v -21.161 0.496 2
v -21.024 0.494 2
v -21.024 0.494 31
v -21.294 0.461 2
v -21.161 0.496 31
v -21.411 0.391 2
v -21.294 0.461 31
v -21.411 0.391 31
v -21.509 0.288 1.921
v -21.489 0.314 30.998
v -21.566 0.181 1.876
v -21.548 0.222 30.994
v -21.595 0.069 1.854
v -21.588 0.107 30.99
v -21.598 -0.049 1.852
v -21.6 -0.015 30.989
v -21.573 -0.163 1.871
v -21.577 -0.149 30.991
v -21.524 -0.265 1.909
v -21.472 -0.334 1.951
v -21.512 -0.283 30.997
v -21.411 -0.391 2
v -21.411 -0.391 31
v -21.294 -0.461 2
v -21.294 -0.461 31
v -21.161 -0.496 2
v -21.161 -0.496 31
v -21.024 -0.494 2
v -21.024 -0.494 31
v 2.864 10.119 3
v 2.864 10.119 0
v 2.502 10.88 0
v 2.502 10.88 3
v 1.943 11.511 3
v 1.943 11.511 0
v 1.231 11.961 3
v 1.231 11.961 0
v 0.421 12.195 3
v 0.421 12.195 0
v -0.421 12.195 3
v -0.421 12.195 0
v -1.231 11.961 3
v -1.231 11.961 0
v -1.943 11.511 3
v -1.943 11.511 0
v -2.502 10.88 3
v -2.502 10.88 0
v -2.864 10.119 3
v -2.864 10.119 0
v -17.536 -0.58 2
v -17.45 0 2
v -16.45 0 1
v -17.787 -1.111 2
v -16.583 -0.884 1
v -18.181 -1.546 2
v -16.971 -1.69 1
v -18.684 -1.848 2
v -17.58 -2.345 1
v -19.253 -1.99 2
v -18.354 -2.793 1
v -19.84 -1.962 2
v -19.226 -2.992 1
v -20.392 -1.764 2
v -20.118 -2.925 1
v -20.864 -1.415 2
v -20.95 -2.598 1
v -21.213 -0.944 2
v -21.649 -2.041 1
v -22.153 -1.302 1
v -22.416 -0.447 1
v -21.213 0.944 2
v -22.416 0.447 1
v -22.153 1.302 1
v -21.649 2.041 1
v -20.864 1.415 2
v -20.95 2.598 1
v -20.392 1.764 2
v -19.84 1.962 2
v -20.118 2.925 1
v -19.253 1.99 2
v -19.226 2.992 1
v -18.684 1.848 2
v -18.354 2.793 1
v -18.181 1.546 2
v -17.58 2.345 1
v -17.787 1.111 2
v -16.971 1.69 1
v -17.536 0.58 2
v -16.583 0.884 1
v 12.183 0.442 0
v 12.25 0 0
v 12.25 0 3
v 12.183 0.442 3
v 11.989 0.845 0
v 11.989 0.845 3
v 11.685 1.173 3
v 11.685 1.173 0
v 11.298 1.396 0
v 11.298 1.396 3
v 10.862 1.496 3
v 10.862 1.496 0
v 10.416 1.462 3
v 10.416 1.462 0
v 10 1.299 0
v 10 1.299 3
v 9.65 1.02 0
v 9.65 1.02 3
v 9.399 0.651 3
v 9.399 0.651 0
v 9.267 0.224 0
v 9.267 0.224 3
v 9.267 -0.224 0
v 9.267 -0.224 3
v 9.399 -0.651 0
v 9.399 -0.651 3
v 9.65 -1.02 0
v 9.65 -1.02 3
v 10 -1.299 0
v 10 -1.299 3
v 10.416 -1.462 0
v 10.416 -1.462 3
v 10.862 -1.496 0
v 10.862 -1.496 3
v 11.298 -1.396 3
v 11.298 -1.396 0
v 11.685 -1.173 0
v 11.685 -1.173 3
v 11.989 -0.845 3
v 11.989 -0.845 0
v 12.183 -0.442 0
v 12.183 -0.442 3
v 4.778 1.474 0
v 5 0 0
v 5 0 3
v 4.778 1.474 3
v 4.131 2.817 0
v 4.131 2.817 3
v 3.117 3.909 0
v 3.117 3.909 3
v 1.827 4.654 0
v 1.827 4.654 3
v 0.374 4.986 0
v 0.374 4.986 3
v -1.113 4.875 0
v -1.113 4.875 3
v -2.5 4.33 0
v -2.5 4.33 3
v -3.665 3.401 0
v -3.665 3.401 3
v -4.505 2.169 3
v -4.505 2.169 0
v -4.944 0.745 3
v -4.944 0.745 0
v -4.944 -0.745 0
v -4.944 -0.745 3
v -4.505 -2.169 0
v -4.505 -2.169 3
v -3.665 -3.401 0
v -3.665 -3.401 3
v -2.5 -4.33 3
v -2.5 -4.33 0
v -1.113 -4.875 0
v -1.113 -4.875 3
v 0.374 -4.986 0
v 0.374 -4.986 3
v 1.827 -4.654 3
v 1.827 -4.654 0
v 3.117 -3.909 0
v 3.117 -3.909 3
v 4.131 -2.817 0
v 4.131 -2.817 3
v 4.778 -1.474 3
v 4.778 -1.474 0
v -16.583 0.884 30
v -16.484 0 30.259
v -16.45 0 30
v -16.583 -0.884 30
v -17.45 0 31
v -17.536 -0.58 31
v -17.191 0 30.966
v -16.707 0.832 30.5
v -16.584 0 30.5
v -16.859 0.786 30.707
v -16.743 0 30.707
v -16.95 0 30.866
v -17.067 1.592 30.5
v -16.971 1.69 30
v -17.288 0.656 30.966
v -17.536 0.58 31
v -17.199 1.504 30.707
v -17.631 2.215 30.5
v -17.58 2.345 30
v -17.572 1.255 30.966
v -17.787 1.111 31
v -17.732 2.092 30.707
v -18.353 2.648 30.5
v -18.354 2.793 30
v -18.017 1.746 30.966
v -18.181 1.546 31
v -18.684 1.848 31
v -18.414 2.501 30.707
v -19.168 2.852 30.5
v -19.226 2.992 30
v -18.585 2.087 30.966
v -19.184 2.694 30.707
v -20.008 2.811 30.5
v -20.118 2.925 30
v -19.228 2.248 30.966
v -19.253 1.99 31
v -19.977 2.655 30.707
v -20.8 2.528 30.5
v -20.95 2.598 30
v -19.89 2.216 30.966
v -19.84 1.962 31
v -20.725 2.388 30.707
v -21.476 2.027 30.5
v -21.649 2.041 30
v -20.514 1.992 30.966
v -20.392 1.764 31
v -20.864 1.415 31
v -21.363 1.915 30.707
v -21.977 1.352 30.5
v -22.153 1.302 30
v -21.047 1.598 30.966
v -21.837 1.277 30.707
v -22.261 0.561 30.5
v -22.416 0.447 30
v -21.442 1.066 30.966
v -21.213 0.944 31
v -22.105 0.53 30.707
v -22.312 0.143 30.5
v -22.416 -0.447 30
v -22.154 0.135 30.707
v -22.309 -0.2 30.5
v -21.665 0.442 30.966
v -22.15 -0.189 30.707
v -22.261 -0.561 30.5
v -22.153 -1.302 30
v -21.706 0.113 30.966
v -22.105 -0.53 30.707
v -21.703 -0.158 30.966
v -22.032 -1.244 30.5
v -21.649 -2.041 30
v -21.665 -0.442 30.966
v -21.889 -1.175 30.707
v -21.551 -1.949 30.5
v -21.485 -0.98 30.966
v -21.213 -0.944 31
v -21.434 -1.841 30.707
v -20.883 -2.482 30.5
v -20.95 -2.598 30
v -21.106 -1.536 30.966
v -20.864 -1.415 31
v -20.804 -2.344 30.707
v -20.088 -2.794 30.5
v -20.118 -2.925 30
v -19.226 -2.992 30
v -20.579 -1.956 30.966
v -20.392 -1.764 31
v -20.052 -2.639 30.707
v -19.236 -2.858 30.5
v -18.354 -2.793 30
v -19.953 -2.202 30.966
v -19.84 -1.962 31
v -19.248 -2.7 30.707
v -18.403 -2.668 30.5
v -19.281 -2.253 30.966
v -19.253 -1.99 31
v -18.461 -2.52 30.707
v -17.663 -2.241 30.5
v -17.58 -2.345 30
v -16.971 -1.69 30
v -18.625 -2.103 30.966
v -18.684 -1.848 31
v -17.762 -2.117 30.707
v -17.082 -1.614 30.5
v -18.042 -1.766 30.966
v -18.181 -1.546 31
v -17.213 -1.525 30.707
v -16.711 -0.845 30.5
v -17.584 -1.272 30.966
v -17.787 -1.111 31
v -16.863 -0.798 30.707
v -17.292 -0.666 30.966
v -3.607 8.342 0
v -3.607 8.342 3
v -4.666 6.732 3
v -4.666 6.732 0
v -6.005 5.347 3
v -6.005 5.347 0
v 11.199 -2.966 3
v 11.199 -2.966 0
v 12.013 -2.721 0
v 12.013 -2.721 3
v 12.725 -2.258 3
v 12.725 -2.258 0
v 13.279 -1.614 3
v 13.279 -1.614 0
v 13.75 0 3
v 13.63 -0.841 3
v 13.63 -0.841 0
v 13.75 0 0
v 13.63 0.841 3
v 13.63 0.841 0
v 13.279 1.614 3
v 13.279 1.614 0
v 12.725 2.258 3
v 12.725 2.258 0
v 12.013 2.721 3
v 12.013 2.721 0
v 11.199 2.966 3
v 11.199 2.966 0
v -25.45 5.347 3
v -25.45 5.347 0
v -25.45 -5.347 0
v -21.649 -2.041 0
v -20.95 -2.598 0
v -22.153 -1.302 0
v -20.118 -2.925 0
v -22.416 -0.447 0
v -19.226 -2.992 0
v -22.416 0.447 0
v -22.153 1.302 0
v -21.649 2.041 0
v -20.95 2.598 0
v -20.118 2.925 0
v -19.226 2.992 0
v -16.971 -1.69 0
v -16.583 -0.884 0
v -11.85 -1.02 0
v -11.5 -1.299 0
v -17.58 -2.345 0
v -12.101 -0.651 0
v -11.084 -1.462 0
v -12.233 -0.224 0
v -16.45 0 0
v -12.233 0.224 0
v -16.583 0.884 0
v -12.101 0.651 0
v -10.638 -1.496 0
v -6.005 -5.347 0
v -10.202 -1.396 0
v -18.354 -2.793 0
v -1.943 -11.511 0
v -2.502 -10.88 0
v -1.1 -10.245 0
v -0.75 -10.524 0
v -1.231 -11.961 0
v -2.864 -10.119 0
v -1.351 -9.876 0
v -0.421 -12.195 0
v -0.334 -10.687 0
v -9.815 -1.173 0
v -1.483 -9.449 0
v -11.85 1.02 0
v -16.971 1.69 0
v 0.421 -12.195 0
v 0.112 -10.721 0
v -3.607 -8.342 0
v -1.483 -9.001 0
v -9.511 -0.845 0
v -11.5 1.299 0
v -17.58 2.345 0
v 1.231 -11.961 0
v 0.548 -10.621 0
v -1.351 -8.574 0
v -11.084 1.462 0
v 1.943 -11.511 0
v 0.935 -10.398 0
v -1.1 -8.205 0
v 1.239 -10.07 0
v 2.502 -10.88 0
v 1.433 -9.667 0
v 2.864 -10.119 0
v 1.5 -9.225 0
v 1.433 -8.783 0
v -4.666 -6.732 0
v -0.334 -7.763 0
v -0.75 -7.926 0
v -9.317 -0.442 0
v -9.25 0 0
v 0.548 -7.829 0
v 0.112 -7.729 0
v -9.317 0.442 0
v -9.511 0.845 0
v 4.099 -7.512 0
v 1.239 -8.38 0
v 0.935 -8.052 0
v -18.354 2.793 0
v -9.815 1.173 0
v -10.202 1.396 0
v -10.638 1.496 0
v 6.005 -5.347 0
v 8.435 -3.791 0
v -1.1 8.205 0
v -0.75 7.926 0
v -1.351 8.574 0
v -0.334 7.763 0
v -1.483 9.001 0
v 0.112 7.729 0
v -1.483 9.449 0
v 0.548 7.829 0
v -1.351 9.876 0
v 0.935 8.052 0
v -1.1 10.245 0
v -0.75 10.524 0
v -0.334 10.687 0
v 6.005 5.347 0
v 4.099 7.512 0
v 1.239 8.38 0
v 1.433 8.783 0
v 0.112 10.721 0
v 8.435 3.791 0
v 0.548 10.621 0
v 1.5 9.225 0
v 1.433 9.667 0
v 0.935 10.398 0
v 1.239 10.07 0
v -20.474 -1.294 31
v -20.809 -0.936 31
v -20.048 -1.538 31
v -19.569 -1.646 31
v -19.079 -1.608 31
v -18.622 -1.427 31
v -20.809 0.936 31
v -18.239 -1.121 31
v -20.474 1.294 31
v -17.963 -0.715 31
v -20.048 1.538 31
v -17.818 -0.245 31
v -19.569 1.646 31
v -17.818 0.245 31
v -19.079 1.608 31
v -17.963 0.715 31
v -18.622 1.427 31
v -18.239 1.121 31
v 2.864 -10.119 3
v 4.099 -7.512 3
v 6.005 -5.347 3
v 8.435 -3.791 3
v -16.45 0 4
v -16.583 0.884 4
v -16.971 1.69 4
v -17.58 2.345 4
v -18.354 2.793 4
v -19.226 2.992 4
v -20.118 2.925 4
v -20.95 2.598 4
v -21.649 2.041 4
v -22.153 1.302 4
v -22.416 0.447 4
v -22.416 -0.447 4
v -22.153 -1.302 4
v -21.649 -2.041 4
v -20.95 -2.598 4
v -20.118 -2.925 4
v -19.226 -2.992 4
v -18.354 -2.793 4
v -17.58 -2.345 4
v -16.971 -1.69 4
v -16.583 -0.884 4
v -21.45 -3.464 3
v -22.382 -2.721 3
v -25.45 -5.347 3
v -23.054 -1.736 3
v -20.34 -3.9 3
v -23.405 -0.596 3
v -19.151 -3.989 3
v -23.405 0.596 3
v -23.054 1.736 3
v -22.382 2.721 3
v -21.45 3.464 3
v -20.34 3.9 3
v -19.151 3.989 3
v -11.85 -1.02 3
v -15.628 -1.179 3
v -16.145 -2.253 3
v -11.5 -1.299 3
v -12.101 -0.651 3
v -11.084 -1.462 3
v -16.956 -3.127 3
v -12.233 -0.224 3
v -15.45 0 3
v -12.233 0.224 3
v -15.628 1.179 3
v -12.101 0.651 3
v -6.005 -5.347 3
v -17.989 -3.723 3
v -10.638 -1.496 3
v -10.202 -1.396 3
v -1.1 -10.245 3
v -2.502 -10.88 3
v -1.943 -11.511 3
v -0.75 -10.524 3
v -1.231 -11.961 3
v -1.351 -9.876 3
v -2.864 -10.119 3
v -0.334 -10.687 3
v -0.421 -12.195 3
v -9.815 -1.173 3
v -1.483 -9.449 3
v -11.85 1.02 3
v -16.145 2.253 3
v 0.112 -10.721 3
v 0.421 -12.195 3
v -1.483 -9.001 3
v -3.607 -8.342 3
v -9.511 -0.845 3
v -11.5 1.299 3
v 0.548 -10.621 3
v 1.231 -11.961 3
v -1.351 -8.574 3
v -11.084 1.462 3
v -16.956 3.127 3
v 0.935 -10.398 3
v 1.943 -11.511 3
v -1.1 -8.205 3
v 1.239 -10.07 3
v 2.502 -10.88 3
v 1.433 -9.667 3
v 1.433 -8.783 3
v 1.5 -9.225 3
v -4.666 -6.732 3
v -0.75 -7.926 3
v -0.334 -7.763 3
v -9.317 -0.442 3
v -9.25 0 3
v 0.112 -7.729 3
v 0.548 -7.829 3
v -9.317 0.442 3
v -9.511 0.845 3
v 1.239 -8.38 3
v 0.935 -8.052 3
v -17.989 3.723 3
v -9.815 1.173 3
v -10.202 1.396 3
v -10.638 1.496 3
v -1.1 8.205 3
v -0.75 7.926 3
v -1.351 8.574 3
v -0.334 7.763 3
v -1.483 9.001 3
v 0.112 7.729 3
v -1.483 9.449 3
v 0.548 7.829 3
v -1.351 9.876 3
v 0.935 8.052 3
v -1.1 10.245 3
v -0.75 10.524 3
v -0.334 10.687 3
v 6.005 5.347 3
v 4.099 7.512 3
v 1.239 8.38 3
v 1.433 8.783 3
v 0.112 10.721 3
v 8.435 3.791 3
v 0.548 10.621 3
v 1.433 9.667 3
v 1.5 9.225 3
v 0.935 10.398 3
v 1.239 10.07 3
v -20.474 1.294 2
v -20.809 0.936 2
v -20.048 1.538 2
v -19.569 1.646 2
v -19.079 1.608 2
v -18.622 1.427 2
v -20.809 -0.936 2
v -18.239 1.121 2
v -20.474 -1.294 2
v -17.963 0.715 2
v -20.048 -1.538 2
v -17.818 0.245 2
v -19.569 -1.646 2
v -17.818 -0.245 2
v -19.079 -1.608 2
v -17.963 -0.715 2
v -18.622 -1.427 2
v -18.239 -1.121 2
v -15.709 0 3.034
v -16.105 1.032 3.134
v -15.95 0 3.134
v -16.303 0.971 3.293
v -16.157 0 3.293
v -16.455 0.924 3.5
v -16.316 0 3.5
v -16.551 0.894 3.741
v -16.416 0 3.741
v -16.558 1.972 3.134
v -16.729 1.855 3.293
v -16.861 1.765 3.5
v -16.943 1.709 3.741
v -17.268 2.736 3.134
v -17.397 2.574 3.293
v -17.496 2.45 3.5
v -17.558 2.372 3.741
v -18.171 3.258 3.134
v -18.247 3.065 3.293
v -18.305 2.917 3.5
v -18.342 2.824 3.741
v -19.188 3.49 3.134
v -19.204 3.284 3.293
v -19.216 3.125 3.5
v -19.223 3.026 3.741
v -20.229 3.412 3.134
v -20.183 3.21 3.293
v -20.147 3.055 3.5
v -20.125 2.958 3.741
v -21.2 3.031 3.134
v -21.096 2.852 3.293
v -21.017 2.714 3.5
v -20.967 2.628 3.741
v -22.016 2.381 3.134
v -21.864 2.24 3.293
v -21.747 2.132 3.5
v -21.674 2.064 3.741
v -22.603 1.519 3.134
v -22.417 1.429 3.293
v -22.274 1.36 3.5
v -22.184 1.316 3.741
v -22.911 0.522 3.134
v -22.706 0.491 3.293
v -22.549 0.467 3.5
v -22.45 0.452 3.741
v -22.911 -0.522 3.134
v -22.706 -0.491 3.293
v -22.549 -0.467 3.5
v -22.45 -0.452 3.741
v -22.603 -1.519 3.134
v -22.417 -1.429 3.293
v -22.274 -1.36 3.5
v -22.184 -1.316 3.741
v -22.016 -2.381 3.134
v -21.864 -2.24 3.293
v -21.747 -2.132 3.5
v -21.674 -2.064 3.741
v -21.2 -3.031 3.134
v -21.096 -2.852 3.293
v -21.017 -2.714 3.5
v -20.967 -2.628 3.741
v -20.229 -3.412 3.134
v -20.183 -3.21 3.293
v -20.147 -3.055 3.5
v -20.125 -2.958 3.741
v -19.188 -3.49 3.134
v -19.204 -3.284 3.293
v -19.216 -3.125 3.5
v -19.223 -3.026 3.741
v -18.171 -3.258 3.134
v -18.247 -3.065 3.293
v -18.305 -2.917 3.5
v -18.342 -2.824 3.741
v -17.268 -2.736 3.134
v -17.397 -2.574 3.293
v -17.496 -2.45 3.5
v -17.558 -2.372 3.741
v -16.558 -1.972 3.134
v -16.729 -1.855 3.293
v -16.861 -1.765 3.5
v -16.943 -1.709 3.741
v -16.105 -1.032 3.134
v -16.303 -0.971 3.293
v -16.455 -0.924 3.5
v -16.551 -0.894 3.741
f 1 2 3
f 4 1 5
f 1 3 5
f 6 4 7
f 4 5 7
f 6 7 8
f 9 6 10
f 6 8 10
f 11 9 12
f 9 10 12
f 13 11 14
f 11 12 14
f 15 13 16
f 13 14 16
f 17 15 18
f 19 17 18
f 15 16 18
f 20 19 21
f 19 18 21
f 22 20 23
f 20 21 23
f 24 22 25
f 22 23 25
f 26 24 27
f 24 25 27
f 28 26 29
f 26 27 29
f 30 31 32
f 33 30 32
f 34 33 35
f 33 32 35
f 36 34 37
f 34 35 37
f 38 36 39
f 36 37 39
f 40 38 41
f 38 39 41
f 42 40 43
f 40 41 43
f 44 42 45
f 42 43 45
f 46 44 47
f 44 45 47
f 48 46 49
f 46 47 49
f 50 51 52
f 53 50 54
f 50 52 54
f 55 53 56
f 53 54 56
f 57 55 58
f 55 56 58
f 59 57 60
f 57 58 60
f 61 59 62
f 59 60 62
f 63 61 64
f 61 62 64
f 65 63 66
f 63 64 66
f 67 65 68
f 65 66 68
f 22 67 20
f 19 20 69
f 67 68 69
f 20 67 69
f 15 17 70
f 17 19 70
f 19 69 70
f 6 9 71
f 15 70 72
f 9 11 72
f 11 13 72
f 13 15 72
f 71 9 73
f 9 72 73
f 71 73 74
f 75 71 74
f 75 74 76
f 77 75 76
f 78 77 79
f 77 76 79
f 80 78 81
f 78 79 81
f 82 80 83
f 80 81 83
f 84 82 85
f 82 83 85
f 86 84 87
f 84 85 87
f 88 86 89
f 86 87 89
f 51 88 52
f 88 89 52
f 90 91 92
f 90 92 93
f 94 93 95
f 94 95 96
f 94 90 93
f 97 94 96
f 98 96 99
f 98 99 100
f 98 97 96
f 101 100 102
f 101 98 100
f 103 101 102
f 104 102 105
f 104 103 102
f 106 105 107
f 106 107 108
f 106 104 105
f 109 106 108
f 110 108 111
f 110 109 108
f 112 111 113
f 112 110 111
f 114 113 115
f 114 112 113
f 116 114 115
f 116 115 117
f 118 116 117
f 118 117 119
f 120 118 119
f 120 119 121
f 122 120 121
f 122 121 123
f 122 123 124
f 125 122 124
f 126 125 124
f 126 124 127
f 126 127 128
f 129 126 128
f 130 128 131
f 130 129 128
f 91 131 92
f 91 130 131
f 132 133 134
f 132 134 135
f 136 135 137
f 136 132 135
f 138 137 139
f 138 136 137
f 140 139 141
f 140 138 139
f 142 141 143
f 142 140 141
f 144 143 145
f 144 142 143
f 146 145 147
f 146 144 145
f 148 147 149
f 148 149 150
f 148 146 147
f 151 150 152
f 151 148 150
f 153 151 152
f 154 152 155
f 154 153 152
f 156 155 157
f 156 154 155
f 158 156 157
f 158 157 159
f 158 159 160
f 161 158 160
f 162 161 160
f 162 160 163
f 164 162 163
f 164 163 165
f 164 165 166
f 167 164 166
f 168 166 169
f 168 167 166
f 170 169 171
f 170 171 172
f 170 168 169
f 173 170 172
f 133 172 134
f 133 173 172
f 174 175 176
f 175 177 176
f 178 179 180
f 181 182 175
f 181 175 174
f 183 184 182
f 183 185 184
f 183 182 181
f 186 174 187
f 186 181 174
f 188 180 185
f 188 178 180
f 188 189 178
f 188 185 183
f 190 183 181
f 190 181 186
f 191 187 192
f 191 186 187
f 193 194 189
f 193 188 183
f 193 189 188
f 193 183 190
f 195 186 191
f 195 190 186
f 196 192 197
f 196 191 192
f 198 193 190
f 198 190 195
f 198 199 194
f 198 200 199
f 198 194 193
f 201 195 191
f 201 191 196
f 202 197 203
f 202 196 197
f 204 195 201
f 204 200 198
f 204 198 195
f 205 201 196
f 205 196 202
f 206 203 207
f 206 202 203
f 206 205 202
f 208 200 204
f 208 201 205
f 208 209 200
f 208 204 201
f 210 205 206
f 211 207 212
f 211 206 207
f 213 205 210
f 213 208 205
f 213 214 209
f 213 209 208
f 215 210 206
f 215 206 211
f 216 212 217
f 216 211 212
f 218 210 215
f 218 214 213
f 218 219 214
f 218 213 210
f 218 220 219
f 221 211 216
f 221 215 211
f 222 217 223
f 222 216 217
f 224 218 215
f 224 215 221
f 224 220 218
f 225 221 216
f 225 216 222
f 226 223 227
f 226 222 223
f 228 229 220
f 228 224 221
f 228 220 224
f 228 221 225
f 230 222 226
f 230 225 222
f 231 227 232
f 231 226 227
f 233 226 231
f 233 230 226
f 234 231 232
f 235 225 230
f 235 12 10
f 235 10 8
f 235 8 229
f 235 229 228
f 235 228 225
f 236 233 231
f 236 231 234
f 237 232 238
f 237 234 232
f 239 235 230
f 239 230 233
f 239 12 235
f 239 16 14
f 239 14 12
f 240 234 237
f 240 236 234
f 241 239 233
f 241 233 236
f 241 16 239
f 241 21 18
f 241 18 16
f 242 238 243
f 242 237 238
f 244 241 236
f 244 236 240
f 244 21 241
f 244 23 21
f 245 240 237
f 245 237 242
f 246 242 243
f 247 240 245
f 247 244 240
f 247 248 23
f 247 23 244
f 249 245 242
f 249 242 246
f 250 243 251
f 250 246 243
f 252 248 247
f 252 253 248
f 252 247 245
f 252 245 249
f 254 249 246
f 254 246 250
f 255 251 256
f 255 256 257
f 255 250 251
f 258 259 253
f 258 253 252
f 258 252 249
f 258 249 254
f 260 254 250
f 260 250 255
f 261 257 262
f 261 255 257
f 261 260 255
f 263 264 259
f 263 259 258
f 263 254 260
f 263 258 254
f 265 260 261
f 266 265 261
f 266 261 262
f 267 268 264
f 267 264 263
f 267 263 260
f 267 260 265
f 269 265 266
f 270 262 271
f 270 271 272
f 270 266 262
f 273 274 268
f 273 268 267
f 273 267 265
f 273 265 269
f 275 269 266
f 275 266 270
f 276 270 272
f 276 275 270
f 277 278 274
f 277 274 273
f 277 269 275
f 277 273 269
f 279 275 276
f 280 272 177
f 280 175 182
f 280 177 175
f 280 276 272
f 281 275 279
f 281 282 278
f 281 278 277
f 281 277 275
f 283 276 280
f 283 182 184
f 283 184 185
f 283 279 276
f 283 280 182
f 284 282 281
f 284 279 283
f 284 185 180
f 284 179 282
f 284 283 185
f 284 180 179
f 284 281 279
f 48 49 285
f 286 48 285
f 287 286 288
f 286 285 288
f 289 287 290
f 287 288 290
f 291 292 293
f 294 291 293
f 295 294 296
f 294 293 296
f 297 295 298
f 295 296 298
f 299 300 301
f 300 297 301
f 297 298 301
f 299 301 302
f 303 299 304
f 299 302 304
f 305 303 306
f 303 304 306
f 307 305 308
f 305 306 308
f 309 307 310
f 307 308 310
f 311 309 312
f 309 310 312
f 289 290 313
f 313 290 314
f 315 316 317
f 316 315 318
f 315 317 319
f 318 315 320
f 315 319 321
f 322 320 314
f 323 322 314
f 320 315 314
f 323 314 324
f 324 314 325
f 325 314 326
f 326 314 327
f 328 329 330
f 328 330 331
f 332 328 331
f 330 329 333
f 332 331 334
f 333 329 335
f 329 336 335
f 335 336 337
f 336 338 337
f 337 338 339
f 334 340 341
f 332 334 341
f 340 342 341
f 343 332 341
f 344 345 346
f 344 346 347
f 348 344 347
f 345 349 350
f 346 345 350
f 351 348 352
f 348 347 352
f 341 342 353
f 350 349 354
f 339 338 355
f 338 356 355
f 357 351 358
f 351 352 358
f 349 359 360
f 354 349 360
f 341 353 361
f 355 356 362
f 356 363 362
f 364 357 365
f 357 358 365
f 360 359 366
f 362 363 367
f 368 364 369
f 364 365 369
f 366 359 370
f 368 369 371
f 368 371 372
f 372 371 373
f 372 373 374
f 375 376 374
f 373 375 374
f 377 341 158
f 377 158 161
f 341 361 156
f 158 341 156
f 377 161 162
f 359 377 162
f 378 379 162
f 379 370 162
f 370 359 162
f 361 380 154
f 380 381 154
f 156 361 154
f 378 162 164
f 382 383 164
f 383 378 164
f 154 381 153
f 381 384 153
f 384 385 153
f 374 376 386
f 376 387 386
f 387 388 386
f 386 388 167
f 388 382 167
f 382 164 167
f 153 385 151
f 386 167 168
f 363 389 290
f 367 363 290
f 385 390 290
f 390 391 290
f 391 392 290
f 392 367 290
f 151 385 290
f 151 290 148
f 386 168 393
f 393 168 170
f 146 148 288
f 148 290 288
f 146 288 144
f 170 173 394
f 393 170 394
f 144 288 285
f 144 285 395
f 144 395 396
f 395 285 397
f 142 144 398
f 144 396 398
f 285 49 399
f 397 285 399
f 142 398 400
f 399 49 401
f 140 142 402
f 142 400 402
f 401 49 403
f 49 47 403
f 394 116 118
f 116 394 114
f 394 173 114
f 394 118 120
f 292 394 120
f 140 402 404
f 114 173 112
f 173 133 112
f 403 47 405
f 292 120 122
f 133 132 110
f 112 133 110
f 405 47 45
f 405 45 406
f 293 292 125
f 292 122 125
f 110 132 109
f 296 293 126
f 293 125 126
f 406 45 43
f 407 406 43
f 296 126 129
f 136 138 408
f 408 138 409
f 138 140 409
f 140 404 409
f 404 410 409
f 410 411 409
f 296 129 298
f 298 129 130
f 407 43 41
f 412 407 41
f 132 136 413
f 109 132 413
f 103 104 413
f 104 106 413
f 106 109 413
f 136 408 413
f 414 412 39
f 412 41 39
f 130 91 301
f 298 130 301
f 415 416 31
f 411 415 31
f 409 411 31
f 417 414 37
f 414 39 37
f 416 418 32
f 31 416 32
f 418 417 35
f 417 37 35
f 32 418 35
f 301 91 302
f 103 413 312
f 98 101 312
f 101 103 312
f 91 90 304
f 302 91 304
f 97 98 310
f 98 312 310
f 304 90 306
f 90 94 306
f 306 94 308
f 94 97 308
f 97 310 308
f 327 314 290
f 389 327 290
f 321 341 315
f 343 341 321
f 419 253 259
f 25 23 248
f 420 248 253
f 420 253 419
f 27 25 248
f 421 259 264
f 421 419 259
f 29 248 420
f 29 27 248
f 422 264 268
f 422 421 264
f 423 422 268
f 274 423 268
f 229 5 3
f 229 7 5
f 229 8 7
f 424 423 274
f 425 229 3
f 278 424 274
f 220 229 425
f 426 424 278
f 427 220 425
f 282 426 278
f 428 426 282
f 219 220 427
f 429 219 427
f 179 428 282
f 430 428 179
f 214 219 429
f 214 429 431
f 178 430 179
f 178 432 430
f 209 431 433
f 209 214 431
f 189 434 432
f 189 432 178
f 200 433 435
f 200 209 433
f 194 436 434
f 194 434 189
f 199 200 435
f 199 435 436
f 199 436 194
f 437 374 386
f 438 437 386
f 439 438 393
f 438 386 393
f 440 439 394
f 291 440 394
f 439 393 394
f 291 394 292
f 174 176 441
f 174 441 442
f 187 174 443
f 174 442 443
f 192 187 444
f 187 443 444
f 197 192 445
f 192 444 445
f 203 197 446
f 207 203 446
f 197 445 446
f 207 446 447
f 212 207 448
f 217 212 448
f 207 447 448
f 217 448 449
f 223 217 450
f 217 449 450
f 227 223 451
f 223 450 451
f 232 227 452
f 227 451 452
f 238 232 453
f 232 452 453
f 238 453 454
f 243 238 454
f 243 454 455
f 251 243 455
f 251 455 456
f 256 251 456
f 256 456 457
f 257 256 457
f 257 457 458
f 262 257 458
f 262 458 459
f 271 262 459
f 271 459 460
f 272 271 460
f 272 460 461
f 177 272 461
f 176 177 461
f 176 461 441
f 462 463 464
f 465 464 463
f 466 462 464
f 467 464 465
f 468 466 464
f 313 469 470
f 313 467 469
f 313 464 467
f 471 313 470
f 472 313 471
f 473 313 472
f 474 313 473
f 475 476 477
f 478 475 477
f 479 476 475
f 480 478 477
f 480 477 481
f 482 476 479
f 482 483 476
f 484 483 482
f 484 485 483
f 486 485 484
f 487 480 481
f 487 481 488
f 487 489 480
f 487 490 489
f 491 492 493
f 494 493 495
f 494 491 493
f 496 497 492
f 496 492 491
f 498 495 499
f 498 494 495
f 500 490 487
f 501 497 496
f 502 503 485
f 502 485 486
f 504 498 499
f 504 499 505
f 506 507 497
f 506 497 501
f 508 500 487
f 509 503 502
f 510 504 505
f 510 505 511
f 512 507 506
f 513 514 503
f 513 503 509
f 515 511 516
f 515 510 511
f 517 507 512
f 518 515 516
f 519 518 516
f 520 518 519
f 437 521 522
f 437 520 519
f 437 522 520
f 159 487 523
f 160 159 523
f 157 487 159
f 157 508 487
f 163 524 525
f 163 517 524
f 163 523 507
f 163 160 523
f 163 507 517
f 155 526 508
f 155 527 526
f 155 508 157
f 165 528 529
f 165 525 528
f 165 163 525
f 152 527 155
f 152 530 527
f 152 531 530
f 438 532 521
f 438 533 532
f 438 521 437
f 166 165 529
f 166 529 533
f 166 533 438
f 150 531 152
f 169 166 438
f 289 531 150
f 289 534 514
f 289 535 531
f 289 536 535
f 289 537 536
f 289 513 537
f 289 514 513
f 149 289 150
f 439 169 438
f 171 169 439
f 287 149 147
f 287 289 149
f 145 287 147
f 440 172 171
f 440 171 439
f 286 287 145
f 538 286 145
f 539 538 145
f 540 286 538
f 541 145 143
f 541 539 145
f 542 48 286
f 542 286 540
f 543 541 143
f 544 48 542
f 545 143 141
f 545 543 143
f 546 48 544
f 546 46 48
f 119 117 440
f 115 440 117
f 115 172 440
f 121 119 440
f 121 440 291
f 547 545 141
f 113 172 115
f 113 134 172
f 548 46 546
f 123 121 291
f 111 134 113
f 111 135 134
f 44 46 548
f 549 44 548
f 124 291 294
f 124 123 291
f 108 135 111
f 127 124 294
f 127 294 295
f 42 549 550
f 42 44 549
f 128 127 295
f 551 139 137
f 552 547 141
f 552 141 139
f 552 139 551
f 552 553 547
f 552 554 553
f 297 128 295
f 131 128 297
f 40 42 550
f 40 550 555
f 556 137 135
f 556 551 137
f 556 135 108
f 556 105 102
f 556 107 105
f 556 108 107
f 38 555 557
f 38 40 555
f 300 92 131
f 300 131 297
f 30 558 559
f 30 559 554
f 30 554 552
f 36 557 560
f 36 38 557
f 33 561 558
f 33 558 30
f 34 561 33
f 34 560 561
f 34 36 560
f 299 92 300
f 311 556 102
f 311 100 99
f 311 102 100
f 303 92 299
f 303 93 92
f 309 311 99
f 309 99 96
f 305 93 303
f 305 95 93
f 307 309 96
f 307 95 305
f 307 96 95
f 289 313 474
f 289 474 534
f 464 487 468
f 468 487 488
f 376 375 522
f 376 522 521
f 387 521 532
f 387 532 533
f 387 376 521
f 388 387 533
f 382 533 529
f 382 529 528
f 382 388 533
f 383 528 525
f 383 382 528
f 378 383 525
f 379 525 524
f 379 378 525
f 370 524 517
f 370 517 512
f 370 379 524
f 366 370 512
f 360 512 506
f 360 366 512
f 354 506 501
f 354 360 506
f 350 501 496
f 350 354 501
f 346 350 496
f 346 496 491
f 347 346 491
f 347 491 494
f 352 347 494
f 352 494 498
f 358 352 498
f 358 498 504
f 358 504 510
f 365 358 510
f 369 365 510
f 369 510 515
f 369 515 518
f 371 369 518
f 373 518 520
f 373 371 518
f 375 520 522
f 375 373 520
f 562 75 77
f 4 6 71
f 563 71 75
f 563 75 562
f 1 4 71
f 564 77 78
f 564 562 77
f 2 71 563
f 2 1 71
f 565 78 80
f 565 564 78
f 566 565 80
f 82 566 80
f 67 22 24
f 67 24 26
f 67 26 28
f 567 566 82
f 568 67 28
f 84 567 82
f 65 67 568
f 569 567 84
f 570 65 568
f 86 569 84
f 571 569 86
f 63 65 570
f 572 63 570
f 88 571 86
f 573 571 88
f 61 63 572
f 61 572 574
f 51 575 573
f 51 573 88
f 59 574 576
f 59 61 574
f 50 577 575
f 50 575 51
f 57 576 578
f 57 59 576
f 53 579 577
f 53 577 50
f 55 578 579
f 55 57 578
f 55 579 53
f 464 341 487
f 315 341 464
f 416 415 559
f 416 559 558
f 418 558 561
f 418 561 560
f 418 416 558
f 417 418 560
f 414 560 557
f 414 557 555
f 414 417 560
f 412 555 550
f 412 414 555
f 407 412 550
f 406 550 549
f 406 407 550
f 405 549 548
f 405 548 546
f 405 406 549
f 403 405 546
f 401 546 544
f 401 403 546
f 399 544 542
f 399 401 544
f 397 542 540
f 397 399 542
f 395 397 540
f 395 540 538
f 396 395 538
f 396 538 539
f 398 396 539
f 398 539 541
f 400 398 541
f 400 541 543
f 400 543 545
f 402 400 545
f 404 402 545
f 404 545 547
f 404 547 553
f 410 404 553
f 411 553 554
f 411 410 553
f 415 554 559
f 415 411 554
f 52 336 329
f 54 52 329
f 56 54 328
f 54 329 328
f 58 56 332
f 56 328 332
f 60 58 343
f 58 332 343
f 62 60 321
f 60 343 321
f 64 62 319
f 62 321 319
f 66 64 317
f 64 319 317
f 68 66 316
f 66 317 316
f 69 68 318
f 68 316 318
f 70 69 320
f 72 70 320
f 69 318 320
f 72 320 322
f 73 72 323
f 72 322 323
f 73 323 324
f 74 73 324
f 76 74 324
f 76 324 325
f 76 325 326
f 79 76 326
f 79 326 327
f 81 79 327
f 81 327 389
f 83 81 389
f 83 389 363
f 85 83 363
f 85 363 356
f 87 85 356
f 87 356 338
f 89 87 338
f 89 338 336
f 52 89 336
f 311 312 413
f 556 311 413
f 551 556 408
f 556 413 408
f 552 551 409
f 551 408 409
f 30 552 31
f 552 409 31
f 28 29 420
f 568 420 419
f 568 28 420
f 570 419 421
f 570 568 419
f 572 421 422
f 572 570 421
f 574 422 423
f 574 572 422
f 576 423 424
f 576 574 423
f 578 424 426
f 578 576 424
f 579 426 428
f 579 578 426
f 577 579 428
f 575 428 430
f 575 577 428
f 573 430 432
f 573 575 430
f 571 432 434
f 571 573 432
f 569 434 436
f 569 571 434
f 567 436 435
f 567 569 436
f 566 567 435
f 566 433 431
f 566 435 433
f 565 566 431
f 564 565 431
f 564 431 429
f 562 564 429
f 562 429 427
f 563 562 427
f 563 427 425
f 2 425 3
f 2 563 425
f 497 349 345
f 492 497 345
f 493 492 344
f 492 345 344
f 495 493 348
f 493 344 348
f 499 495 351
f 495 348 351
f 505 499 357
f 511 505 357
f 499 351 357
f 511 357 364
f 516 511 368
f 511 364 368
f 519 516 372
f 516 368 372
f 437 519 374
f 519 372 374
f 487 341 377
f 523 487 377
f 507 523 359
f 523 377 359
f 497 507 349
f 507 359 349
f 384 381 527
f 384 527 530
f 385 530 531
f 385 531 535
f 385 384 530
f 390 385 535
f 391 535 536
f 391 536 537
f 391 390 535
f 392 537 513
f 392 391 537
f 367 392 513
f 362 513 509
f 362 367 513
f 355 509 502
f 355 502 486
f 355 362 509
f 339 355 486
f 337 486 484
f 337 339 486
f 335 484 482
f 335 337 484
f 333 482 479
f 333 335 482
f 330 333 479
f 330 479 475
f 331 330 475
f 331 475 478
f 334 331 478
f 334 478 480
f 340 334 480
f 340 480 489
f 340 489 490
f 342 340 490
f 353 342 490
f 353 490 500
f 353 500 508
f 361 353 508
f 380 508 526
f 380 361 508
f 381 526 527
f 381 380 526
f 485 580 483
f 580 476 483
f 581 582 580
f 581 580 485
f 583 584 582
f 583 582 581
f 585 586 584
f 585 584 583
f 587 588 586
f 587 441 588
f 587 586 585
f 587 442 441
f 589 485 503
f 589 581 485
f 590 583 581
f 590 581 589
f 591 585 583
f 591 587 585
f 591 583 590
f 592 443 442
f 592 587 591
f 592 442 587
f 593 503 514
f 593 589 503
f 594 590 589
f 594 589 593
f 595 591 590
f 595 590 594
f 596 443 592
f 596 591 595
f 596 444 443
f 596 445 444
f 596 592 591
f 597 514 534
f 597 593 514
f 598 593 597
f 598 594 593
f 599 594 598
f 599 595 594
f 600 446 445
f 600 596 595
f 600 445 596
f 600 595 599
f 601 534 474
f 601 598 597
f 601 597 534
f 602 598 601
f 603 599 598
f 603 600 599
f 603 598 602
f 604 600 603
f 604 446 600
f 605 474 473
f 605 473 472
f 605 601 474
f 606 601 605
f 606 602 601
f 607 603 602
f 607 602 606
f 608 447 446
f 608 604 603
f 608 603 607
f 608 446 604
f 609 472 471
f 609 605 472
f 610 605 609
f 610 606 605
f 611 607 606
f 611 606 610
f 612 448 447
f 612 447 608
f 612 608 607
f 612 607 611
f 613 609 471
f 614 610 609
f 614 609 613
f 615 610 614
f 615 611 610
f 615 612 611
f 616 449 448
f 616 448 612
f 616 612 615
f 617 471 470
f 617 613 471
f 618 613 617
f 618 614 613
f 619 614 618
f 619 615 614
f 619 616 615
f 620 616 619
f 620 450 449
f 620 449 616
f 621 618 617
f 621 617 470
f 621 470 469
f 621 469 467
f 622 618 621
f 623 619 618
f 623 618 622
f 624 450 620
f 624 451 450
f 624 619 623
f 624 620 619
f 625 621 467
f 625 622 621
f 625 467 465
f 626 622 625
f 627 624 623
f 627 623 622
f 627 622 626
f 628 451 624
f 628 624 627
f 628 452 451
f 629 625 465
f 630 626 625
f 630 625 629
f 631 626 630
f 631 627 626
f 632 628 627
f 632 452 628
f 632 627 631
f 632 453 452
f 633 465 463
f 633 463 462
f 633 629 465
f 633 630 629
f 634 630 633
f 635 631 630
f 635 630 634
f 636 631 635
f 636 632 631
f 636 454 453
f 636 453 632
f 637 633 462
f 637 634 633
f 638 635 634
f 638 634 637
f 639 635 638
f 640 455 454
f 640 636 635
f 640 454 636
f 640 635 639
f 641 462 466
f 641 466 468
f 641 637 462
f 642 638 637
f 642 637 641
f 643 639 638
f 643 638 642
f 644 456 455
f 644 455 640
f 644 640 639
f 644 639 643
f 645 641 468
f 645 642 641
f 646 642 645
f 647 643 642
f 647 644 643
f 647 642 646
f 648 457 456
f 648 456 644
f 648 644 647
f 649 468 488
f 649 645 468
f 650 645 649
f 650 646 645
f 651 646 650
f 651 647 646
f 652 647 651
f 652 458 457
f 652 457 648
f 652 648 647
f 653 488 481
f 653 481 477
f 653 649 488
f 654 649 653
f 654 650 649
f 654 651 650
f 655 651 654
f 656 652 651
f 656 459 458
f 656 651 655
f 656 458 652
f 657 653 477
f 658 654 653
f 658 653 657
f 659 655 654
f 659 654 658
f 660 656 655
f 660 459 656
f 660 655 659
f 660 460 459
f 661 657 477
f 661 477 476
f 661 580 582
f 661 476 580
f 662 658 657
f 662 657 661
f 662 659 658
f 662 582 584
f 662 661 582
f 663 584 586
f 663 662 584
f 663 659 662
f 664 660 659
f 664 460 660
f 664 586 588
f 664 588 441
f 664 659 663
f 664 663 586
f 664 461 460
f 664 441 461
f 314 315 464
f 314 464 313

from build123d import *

# Parameters (mm, degrees)
SKETCH1_R                = 1.5
SKETCH1_R_2              = 5
SKETCH1_R_3              = 3
BOSS_EXTRUDE1_DEPTH      = 3
SKETCH2_W                = 19.444746102
SKETCH2_H                = 10.693884422
SKETCH2_R                = 3
SKETCH2_R_2              = 1.5
BOSS_EXTRUDE2_DEPTH      = 3
BOSS_EXTRUDE3_DEPTH      = 28
BOSS_EXTRUDE3_DEPTH_BACK = 3
SKETCH3_R                = 3
SKETCH3_R_2              = 1.65
SKETCH4_R                = 0.5
CUT_EXTRUDE1_DEPTH       = 30
SKETCH5_R                = 3
CUT_EXTRUDE2_DEPTH       = 2
CHAMFER1_SIZE            = 1
FILLET2_R                = 1
FILLET3_R                = 1


with BuildPart() as part:
    # Sketch1 → Boss-Extrude1 (new body)
    # profile 1 of 4: a face of its own
    with BuildSketch(Plane.XY):
        with BuildLine():
            ThreePointArc((2.863548114, 10.119478732), (2.965690842, 9.677413339), (3, 9.225))
            ThreePointArc((3, 9.225), (-0.452413339, 6.259309158), (-2.863548114, 10.119478732))
            ThreePointArc((-2.863548114, 10.119478732), (-6.005253898, 5.346942211), (-11.199408085, 2.966147733))
            ThreePointArc((-11.199408085, 2.966147733), (-8.794012303, 2.274667476), (-7.75, 0))
            ThreePointArc((-7.75, 0), (-8.794012303, -2.274667476), (-11.199408085, -2.966147733))
            ThreePointArc((-11.199408085, -2.966147733), (-6.005253898, -5.346942211), (-2.863548114, -10.119478732))
            ThreePointArc((-2.863548114, -10.119478732), (0, -12.225), (2.863548114, -10.119478732))
            ThreePointArc((2.863548114, -10.119478732), (6.005253898, -5.346942211), (11.199408085, -2.966147733))
            ThreePointArc((11.199408085, -2.966147733), (7.75, 0), (11.199408085, 2.966147733))
            ThreePointArc((11.199408085, 2.966147733), (6.005253898, 5.346942211), (2.863548114, 10.119478732))
        make_face()
        with Locations((0, -9.225)):
            Circle(SKETCH1_R, mode=Mode.SUBTRACT)
        Circle(SKETCH1_R_2, mode=Mode.SUBTRACT)
    # profile 2 of 4: a face of its own
    with BuildSketch(Plane.XY):
        with Locations((0, 9.225)):
            Circle(SKETCH1_R_3)
        with Locations((0, 9.225)):
            Circle(SKETCH1_R, mode=Mode.SUBTRACT)
    # profile 3 of 4: a face of its own
    with BuildSketch(Plane.XY):
        with Locations((-10.75, 0)):
            Circle(SKETCH1_R_3)
        with Locations((-10.75, 0)):
            Circle(SKETCH1_R, mode=Mode.SUBTRACT)
    # profile 4 of 4: a face of its own
    with BuildSketch(Plane.XY):
        with Locations((10.75, 0)):
            Circle(SKETCH1_R_3)
        with Locations((10.75, 0)):
            Circle(SKETCH1_R, mode=Mode.SUBTRACT)
    extrude(amount=BOSS_EXTRUDE1_DEPTH)

    # Sketch2 → Boss-Extrude2 (add, through all)
    with BuildSketch(Plane(origin=(0, 0, 0), x_dir=(-1, 0, 0), z_dir=(0, 0, -1))):
        with Locations((15.727626949, 0)):
            Rectangle(SKETCH2_W, SKETCH2_H)
        with Locations((19.45, 0)):
            Circle(SKETCH2_R, mode=Mode.SUBTRACT)
        with Locations(Location((10.75, 0, 0), (0, 0, 180))):
            Circle(SKETCH2_R_2, mode=Mode.SUBTRACT)
    extrude(amount=-BOSS_EXTRUDE2_DEPTH)

    # Sketch3 → Boss-Extrude3 (add, two sides: drawn at the far end of the back side and taken through both)
    with BuildSketch(Plane.XY.offset(3).offset(-BOSS_EXTRUDE3_DEPTH_BACK)):
        with Locations((-19.45, 0)):
            Circle(SKETCH3_R)
        with Locations((-19.45, 0)):
            Circle(SKETCH3_R_2, mode=Mode.SUBTRACT)
    extrude(amount=BOSS_EXTRUDE3_DEPTH + BOSS_EXTRUDE3_DEPTH_BACK)

    # Sketch4 → Cut-Extrude1 (cut)
    with BuildSketch(Plane.XY.offset(31)):
        with Locations((-21.1, 0)):
            Circle(SKETCH4_R)
    extrude(amount=-CUT_EXTRUDE1_DEPTH, mode=Mode.SUBTRACT)

    # Sketch5 → Cut-Extrude2 (cut)
    with BuildSketch(Plane(origin=(0, 0, 0), x_dir=(-1, 0, 0), z_dir=(0, 0, -1))):
        with Locations(Location((19.45, 0, 0), (0, 0, 180))):
            Circle(SKETCH5_R)
    extrude(amount=-CUT_EXTRUDE2_DEPTH, mode=Mode.SUBTRACT)

    # Chamfer1
    # the kernel refuses this chamfer: 1 mm, written as the material it adds along each edge
    with BuildSketch(Plane(origin=(-19.45, 0, 2), x_dir=(1, 0, 0), z_dir=(0, 1, 0))) as chamfer1_piece_1_section:
        Polygon((3 - CHAMFER1_SIZE, 0), (3, CHAMFER1_SIZE), (3, 0), align=None)
    chamfer1_piece_1 = revolve(axis=Axis((-19.45, 0, 2), (0, 0, -1)), mode=Mode.PRIVATE)
    chamfer1_piece_1 = chamfer1_piece_1 - Plane(origin=(-21.1, 0, 1.51482841), x_dir=(1, 0, 0), z_dir=(0, 0, 1)) * Cylinder(0.5, 12, mode=Mode.PRIVATE)
    add(chamfer1_piece_1)

    # Fillet2
    fillet2_edges = [part.edges().sort_by_distance(p)[0] for p in [
        (-22.45, 0, 3),
    ]]
    fillet(fillet2_edges, radius=FILLET2_R)

    # Fillet3
    # the kernel refuses this fillet: 1 mm, written as the material it takes off along each edge
    with BuildSketch(Plane(origin=(-19.45, 0, 31), x_dir=(1, 0, 0), z_dir=(0, -1, 0))) as fillet3_piece_1:
        with BuildLine():
            CenterArc((3 - FILLET3_R, -FILLET3_R), FILLET3_R, 0, 90)
            Line((3 - FILLET3_R, 0), (3, 0))
            Line((3, 0), (3, -FILLET3_R))
        make_face()
    revolve(axis=Axis((-19.45, 0, 31), (0, 0, 1)), mode=Mode.SUBTRACT)


solid = part.part
